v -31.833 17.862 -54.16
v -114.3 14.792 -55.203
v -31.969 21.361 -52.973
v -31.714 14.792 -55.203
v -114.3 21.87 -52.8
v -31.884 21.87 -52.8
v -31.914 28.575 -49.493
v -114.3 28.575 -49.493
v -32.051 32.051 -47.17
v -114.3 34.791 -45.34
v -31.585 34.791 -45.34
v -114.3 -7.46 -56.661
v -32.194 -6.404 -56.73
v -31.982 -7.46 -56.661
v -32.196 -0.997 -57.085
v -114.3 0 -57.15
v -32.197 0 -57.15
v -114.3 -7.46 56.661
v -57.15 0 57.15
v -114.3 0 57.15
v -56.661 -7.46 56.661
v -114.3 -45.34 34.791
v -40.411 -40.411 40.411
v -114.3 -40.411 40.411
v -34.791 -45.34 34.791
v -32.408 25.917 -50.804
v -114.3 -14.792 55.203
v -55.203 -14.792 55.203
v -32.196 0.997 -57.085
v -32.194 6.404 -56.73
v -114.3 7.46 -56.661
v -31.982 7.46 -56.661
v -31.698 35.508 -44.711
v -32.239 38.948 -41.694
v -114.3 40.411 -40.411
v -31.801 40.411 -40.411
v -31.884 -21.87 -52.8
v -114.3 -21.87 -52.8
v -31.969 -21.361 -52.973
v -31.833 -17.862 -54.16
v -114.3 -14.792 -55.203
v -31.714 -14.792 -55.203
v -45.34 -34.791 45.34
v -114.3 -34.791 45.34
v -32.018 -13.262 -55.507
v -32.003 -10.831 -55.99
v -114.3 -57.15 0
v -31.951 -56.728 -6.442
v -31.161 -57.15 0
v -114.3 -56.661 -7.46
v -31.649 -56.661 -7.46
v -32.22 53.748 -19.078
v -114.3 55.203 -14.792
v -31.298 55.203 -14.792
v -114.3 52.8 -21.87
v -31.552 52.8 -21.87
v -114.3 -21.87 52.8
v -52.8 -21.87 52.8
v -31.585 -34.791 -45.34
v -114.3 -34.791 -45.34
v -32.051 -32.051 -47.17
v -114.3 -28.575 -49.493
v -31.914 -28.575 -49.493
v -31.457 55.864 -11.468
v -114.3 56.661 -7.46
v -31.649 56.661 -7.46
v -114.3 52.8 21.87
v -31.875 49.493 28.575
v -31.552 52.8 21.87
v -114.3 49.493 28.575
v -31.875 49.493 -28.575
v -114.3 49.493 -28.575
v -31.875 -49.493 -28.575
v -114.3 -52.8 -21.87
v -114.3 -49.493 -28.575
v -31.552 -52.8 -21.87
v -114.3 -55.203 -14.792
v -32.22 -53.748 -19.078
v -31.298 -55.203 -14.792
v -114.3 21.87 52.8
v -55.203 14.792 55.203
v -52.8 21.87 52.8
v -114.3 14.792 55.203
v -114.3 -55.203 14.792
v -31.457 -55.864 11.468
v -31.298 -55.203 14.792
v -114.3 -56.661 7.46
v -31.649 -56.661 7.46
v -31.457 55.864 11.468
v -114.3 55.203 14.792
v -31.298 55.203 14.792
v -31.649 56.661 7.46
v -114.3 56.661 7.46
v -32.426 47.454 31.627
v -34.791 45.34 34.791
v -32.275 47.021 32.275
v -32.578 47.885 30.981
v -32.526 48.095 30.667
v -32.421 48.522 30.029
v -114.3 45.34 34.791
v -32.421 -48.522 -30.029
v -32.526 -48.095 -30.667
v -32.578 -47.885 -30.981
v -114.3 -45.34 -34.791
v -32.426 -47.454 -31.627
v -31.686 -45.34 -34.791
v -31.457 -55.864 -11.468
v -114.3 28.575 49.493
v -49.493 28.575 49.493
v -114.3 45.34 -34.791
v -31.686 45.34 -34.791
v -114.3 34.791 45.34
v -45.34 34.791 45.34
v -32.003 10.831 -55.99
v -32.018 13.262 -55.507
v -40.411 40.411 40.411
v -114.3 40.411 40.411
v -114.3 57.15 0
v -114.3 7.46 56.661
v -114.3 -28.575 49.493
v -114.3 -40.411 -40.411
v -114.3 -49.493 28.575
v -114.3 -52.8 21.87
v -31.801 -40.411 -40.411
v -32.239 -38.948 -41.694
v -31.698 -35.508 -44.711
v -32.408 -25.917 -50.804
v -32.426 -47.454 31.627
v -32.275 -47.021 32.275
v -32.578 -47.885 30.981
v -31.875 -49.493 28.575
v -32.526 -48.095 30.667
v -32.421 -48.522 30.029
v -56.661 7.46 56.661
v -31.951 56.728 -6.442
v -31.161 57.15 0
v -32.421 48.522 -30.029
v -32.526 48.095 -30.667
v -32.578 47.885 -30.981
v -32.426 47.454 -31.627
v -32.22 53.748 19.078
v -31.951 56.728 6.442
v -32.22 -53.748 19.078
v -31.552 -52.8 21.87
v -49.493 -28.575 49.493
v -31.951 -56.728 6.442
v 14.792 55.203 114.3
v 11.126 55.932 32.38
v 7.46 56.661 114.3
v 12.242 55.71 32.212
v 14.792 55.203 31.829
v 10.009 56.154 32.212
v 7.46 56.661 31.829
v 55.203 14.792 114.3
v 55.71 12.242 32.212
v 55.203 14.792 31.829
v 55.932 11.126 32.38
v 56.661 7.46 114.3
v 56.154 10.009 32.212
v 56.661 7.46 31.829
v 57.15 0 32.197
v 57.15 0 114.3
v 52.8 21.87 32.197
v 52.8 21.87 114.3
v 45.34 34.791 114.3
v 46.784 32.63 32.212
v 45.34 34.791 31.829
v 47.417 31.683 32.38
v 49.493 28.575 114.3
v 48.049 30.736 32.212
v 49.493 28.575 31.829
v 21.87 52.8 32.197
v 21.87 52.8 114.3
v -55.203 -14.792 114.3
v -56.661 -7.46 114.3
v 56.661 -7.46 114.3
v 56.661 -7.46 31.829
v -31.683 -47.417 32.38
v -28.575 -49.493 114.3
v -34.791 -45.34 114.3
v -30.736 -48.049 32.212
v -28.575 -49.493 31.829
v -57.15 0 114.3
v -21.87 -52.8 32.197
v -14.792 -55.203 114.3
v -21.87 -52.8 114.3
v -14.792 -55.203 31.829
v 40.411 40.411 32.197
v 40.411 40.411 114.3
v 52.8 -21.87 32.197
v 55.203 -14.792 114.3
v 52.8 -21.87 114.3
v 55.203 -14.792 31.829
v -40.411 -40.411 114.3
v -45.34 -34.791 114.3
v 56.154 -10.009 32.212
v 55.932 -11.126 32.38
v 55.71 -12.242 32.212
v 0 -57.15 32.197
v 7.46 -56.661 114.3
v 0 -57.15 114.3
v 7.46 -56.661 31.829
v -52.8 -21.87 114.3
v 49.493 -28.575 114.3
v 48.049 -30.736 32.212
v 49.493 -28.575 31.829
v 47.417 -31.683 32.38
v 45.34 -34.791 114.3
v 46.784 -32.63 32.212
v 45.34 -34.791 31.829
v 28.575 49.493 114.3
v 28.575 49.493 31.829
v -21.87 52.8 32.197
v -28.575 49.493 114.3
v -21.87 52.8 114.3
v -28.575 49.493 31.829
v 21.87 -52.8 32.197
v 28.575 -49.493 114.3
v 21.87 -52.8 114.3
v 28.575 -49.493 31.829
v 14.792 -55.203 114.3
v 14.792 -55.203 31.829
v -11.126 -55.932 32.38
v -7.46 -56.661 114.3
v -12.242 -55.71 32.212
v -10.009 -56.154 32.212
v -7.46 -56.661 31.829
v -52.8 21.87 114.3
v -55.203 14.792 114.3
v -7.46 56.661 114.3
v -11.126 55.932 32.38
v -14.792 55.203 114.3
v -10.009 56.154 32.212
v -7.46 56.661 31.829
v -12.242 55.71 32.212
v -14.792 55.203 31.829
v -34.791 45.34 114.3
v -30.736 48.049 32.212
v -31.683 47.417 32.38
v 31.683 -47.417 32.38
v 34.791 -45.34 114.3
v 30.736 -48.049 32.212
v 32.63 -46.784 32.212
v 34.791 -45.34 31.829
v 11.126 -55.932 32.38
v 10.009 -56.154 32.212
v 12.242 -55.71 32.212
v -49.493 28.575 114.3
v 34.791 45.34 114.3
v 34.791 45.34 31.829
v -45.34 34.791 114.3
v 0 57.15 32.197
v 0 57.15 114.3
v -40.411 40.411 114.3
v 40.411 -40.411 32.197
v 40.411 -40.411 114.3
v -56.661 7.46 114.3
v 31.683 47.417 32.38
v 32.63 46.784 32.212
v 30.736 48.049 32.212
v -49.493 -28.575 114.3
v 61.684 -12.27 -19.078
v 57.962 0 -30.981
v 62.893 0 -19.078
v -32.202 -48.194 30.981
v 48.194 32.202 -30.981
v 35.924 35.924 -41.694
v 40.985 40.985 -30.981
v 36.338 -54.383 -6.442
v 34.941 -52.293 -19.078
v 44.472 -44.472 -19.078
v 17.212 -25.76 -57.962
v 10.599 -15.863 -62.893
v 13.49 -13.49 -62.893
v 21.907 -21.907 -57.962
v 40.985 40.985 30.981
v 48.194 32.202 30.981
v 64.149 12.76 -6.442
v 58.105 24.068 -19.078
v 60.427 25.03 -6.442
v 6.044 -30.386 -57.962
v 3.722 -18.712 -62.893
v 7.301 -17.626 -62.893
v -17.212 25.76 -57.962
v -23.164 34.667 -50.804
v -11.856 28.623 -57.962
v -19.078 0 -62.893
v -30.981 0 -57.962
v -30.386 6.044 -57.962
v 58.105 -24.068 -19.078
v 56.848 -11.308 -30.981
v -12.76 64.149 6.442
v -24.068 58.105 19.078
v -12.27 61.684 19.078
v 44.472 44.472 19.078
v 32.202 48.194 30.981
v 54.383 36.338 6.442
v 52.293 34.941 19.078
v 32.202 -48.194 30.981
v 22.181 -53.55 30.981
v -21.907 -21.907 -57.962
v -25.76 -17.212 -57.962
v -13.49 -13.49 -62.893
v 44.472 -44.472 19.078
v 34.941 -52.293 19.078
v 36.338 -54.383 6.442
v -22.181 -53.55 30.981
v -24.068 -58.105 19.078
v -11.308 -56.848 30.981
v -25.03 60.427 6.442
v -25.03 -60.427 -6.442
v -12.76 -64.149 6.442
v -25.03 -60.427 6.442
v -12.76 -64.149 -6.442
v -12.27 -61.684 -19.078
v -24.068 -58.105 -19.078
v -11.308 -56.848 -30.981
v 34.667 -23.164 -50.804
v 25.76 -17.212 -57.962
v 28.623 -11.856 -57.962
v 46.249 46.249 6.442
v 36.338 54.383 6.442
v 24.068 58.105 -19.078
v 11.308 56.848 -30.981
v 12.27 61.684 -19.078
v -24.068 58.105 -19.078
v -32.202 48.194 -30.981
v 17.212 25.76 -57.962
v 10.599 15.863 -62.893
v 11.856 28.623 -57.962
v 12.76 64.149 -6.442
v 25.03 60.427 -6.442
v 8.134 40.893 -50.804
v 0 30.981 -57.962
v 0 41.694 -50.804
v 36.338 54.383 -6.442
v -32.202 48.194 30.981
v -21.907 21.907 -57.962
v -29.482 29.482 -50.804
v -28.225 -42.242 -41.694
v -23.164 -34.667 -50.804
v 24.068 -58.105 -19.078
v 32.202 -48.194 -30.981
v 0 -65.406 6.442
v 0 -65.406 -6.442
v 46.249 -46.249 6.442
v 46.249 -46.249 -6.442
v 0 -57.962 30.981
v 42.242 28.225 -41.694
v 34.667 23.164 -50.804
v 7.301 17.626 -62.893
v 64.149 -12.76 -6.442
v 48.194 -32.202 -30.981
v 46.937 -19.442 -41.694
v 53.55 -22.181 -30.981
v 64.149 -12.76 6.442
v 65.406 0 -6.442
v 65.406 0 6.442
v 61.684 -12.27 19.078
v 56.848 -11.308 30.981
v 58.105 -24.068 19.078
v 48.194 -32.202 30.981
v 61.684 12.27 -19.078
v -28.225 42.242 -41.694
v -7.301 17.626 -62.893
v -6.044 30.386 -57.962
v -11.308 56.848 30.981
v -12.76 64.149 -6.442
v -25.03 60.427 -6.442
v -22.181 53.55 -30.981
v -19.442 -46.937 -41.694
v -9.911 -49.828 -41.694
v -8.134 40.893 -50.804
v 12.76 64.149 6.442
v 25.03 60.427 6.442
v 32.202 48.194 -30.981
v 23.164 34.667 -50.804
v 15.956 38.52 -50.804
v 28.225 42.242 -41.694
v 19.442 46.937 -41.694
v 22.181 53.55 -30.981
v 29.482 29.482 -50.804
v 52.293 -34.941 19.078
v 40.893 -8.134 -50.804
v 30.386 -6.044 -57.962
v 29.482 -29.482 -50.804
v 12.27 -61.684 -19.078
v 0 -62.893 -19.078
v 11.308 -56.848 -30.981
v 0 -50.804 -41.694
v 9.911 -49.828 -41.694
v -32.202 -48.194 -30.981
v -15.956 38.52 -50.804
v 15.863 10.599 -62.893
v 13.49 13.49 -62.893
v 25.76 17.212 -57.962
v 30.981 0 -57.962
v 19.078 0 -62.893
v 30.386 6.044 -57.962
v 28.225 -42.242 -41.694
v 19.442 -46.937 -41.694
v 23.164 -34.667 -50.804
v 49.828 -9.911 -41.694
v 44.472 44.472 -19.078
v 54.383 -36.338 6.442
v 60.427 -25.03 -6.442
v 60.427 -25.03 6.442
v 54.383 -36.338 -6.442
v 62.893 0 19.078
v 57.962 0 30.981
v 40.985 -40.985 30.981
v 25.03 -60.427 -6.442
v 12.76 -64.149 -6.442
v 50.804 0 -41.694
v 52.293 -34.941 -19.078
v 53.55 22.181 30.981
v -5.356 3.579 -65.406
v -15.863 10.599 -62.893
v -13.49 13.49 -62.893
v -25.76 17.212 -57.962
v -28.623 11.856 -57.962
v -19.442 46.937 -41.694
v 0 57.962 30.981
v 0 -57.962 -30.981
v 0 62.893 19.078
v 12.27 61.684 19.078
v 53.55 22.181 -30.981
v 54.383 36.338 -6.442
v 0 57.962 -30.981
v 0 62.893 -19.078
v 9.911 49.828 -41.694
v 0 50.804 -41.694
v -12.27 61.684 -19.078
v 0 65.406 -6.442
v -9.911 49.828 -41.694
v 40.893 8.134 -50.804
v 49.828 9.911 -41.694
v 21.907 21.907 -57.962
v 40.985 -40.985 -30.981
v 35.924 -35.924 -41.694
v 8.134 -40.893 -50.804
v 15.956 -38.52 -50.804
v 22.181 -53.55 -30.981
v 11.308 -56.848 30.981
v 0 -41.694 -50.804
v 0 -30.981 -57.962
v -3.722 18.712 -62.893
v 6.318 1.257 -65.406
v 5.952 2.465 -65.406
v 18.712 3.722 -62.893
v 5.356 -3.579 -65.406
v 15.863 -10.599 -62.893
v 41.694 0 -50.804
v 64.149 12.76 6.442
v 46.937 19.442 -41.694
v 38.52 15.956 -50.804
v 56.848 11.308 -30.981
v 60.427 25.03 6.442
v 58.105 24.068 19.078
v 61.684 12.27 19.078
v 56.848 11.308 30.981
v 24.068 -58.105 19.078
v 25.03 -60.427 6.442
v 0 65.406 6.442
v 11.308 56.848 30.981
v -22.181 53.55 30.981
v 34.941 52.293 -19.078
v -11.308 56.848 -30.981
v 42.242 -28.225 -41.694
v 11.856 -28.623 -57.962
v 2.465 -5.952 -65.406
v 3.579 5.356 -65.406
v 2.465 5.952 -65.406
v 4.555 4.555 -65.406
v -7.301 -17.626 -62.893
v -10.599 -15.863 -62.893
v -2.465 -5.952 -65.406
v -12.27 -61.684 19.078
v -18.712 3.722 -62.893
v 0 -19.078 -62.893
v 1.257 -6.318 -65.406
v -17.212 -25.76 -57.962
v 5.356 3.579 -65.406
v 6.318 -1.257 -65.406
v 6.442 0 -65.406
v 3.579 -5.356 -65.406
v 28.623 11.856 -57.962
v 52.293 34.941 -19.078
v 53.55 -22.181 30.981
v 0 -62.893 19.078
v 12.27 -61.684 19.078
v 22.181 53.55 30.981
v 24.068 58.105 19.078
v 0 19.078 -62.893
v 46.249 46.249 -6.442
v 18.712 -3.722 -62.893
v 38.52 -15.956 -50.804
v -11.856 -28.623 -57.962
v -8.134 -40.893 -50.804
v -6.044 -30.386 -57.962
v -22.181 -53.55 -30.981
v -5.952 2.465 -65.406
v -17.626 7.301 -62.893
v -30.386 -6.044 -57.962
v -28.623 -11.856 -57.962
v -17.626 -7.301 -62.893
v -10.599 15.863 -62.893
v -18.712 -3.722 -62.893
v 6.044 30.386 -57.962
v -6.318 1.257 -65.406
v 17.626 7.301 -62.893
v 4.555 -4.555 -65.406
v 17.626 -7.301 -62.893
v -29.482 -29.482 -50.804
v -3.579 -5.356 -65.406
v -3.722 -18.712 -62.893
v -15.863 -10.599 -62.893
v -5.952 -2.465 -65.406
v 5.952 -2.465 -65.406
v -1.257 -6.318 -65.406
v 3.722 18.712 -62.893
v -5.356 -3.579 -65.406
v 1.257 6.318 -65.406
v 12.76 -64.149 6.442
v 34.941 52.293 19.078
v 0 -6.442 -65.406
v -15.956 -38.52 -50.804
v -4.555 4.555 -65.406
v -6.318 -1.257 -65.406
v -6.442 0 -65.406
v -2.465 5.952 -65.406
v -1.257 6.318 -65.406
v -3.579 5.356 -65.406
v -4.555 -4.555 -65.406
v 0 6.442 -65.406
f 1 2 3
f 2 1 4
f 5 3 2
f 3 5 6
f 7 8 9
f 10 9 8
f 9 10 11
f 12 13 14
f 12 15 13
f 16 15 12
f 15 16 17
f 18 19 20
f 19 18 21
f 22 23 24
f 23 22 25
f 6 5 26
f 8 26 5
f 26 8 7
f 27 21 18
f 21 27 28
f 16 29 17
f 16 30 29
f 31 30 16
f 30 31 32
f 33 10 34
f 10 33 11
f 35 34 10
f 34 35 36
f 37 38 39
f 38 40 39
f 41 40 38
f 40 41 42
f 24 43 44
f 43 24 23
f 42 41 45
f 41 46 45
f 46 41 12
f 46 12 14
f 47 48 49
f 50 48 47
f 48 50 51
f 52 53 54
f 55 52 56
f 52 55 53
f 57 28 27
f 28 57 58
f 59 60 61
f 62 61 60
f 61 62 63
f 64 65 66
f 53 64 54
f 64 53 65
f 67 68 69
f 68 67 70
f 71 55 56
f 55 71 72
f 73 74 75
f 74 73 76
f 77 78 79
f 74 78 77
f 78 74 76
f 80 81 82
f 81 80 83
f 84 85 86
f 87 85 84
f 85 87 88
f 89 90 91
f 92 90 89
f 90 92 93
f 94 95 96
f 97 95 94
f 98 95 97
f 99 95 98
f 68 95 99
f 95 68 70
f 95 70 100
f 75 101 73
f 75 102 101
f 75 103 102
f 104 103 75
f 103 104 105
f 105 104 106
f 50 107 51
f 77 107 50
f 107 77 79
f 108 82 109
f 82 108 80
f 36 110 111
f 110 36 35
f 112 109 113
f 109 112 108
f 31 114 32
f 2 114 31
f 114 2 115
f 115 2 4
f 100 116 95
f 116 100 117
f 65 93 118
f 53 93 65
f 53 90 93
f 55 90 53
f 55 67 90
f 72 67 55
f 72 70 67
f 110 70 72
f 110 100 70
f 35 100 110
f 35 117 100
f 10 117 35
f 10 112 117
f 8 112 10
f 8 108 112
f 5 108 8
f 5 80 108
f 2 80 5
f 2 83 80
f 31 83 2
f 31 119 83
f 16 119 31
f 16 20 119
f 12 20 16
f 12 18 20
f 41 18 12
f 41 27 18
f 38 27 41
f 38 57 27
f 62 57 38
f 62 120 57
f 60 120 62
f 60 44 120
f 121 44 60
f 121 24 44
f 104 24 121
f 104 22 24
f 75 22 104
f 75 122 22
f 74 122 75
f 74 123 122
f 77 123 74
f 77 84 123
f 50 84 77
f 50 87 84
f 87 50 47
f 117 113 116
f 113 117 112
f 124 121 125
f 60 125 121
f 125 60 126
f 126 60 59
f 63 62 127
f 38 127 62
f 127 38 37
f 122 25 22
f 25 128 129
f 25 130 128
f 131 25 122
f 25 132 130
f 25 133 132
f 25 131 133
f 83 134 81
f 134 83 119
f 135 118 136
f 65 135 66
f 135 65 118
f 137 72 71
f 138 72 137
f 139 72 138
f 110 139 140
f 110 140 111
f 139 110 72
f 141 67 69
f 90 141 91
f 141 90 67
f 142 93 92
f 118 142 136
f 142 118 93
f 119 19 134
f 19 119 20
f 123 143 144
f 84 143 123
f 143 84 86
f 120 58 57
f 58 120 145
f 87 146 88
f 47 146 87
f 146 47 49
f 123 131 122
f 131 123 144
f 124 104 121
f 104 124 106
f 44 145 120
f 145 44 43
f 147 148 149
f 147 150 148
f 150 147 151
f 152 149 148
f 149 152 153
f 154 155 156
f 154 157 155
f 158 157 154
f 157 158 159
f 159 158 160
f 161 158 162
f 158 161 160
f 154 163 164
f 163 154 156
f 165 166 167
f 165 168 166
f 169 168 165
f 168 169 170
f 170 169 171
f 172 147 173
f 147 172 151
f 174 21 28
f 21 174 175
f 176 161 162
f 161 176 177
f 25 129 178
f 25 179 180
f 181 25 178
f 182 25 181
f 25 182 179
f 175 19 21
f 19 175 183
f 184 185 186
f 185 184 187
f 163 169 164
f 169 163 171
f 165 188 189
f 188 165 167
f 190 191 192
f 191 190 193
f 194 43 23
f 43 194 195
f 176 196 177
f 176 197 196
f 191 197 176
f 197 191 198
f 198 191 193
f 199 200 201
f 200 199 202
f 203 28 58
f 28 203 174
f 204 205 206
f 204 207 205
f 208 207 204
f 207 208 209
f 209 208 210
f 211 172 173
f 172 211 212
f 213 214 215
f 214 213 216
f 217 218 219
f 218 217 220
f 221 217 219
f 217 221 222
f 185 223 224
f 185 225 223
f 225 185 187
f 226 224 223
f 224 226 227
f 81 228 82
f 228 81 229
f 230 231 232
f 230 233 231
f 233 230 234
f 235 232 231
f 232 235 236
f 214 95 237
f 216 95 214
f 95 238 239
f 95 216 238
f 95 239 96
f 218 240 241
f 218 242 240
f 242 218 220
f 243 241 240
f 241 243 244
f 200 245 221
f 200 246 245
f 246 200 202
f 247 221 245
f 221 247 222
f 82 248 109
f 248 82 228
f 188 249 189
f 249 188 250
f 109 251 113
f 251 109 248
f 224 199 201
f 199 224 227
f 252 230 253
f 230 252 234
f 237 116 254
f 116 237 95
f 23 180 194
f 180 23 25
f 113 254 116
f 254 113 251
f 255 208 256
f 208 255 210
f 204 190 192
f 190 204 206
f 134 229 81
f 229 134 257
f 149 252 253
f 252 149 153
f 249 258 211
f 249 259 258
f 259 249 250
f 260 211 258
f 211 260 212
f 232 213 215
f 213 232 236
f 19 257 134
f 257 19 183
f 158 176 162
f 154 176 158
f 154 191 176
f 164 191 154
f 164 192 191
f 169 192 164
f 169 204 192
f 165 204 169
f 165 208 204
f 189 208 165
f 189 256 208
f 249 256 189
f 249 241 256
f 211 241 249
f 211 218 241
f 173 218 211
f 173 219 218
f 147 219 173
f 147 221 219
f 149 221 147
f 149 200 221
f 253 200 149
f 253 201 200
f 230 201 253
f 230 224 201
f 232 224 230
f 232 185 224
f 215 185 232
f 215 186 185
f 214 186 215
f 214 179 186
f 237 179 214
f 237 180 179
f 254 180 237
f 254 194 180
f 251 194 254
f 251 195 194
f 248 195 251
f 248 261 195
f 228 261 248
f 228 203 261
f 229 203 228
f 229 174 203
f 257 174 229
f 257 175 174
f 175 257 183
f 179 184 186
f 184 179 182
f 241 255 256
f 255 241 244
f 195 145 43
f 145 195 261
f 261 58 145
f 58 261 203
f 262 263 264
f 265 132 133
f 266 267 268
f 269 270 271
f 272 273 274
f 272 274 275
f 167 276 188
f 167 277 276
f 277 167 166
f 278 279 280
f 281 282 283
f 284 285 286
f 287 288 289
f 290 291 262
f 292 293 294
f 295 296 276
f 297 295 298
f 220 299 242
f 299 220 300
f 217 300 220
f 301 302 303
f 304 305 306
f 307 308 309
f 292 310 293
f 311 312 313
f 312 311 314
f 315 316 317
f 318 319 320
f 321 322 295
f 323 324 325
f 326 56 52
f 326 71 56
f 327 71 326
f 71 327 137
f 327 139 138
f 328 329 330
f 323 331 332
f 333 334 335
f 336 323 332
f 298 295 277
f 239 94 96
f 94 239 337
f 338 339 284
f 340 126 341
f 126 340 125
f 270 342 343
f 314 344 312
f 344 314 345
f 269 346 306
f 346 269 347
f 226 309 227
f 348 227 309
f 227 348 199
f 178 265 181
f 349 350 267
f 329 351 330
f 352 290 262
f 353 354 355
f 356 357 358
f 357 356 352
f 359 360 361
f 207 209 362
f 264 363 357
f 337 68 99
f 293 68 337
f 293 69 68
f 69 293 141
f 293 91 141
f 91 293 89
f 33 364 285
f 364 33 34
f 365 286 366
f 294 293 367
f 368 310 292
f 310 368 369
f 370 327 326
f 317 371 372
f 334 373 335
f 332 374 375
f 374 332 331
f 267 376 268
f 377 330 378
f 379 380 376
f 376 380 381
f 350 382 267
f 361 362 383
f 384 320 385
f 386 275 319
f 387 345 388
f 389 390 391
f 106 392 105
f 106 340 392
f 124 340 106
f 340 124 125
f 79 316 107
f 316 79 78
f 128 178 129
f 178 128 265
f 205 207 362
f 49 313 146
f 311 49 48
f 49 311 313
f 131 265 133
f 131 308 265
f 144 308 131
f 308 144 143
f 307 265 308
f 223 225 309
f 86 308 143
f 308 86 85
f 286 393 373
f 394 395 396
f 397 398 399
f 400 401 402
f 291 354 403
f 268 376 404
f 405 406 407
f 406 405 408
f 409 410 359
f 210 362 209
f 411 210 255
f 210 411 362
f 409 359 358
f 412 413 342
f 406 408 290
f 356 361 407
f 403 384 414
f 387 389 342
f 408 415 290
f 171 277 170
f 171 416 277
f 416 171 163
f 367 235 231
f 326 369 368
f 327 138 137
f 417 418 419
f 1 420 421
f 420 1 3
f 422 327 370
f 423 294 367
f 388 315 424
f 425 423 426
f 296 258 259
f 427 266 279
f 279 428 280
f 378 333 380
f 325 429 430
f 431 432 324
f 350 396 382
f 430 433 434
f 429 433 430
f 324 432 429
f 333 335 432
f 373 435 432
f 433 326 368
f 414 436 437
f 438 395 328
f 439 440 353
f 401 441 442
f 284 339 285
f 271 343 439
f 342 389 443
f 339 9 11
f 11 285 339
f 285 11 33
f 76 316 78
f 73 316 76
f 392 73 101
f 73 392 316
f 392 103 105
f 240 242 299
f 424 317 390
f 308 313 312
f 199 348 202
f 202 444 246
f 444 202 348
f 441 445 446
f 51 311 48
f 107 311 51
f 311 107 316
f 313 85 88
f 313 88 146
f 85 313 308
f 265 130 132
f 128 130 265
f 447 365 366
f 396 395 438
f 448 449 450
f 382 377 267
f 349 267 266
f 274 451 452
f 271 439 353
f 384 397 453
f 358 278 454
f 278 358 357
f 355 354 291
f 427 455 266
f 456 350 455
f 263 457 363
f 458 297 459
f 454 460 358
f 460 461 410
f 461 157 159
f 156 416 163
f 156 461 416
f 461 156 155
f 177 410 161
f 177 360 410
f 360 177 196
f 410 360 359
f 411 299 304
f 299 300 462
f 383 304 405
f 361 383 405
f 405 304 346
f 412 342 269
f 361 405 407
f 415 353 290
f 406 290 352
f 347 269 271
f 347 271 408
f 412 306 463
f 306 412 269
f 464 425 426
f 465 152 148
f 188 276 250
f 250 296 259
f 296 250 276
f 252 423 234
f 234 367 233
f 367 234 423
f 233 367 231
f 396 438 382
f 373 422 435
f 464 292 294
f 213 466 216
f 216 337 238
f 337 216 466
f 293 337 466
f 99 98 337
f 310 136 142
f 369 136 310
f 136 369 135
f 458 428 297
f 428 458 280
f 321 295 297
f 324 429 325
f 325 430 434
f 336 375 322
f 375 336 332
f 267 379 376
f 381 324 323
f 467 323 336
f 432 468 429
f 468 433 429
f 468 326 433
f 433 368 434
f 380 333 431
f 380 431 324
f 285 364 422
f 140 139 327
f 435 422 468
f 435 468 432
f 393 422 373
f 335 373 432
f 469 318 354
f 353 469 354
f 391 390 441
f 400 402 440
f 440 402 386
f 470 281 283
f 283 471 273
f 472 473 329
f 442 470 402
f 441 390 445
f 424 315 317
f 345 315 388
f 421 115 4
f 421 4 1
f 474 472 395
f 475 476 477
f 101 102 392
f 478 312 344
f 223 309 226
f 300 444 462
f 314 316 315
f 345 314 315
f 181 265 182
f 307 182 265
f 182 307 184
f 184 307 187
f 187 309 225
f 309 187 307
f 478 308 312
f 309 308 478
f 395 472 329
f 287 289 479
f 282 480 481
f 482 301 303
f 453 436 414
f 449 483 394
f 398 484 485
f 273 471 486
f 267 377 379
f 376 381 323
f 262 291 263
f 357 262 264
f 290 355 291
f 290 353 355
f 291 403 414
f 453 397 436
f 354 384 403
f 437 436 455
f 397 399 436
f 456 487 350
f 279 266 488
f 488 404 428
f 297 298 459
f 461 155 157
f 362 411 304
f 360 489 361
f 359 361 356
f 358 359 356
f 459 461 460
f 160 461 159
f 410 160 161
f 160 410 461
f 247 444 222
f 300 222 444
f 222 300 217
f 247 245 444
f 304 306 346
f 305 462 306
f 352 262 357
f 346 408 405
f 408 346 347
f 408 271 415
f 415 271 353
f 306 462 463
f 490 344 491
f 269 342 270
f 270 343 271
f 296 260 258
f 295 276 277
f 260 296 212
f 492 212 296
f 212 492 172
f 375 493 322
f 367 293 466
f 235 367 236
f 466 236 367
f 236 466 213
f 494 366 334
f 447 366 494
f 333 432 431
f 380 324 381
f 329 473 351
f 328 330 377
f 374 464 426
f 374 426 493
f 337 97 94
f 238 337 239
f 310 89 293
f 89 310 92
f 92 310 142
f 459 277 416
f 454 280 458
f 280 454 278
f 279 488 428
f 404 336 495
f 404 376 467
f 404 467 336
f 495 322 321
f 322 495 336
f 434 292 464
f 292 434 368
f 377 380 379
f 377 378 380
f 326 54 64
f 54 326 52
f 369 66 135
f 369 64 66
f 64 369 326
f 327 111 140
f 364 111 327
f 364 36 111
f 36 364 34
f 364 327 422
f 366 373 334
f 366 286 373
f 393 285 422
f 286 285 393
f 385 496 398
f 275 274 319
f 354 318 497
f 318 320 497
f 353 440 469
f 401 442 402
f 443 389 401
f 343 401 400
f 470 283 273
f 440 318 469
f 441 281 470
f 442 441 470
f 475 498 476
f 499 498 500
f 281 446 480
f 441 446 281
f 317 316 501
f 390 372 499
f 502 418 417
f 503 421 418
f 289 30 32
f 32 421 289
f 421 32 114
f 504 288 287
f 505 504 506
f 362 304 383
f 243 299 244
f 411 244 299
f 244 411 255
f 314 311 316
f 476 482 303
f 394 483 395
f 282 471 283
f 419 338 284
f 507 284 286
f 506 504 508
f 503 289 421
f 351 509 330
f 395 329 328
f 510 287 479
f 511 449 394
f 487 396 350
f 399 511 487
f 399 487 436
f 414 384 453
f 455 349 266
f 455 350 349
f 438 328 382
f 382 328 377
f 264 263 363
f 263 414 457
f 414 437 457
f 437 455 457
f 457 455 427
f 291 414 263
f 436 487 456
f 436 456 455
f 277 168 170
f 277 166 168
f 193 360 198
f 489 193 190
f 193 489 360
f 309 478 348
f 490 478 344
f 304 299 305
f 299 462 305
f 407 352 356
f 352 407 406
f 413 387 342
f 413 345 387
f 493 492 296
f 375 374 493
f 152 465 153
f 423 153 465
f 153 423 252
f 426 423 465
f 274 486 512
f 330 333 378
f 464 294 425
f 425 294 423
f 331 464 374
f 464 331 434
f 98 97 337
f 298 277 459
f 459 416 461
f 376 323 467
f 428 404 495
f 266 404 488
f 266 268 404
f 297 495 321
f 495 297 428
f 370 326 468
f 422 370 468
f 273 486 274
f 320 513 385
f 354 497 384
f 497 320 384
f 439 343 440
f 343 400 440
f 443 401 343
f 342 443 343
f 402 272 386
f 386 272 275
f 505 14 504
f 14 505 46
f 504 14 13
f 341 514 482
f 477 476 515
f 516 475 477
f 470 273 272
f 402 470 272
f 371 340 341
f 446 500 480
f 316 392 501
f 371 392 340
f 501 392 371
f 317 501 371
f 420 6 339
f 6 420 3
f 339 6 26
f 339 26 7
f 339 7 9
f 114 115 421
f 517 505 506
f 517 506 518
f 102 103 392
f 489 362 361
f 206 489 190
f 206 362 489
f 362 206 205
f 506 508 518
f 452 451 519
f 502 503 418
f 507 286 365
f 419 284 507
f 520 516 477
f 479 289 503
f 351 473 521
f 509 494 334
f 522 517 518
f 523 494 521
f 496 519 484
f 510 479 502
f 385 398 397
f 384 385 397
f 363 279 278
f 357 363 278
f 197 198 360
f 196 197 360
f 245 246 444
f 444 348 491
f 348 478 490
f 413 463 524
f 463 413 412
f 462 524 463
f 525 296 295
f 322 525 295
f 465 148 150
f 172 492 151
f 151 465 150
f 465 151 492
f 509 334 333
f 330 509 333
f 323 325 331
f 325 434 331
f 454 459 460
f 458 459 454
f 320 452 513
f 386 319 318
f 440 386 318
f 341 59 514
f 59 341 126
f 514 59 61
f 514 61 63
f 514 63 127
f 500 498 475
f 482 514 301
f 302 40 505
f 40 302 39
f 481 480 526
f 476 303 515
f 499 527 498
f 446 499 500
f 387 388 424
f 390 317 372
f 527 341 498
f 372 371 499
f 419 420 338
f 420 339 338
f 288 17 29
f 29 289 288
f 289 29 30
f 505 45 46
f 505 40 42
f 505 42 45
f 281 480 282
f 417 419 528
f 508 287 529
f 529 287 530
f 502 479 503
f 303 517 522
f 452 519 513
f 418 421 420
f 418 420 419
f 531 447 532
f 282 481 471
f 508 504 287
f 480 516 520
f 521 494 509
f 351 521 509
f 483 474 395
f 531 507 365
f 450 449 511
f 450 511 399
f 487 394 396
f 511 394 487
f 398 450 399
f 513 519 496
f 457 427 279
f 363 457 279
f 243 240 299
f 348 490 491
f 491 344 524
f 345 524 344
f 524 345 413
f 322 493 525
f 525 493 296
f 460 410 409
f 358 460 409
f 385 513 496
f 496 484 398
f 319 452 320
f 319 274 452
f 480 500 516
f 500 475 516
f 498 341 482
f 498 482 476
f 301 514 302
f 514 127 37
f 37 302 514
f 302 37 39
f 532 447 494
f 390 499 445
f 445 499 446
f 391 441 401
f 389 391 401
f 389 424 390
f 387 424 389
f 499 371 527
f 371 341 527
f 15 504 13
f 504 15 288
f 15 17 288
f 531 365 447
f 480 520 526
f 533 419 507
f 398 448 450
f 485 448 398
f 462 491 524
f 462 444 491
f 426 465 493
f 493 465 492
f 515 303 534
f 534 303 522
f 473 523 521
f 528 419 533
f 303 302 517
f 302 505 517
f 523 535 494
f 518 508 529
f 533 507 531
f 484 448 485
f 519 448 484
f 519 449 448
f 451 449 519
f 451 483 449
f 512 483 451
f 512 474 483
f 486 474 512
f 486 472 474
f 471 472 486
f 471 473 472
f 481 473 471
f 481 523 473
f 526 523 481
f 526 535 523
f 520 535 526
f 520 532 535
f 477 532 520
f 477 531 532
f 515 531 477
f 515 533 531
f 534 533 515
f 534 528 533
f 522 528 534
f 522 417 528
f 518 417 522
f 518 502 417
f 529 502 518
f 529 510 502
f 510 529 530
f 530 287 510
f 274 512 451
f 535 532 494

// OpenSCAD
// Auto-generated by scripts/author_from_manifest.py (Phase D.3).
// Source: data/phase_d_manifest.json (sku_intent='victaulic-no11-elbow-45-grooved-4in').
// Do not hand-edit — regenerate from the manifest.
//
// @part victaulic_no11_elbow_45_grooved_4in
// @kind fitting
// @category fitting.elbow
// @display-name "Victaulic No. 11 45° Grooved Elbow 4\""
// @mfg victaulic
// @mfg-pn No._11_4in
// @listing UL FM
// @price-usd 50.00
// @install-minutes 6
// @crew journeyman
// @param size_in number default=4 label="Size" unit="in"
// @port in position=[-0.05,0,0] direction=[-1,0,0] style=grooved size_in=4 role=run_a
// @port out position=[0,0,0.05] direction=[0,0,1] style=grooved size_in=4 role=run_b

size_in = 4.0;

function od_mm(nps) =
    nps ==   1  ? 33.4 :
    nps == 1.25 ? 42.2 :
    nps == 1.5  ? 48.3 :
    nps ==   2  ? 60.3 :
    nps == 2.5  ? 73.0 :
    nps ==   3  ? 88.9 :
    nps ==   4  ? 114.3 :
    nps ==   5  ? 141.3 :
    nps ==   6  ? 168.3 :
    nps ==   8  ? 219.1 :
    nps ==  10  ? 273.0 : 60.3;

od = od_mm(size_in);
leg = od * 1.0;

union() {
    // Inlet leg along -X
    translate([-leg/2, 0, 0])
        rotate([0, 90, 0])
        cylinder(h = leg, d = od, center = true, $fn = 48);
    // Outlet leg along +Z
    translate([0, 0, leg/2])
        cylinder(h = leg, d = od, center = true, $fn = 48);
    // Knuckle
    sphere(d = od * 1.15, $fn = 32);
}
